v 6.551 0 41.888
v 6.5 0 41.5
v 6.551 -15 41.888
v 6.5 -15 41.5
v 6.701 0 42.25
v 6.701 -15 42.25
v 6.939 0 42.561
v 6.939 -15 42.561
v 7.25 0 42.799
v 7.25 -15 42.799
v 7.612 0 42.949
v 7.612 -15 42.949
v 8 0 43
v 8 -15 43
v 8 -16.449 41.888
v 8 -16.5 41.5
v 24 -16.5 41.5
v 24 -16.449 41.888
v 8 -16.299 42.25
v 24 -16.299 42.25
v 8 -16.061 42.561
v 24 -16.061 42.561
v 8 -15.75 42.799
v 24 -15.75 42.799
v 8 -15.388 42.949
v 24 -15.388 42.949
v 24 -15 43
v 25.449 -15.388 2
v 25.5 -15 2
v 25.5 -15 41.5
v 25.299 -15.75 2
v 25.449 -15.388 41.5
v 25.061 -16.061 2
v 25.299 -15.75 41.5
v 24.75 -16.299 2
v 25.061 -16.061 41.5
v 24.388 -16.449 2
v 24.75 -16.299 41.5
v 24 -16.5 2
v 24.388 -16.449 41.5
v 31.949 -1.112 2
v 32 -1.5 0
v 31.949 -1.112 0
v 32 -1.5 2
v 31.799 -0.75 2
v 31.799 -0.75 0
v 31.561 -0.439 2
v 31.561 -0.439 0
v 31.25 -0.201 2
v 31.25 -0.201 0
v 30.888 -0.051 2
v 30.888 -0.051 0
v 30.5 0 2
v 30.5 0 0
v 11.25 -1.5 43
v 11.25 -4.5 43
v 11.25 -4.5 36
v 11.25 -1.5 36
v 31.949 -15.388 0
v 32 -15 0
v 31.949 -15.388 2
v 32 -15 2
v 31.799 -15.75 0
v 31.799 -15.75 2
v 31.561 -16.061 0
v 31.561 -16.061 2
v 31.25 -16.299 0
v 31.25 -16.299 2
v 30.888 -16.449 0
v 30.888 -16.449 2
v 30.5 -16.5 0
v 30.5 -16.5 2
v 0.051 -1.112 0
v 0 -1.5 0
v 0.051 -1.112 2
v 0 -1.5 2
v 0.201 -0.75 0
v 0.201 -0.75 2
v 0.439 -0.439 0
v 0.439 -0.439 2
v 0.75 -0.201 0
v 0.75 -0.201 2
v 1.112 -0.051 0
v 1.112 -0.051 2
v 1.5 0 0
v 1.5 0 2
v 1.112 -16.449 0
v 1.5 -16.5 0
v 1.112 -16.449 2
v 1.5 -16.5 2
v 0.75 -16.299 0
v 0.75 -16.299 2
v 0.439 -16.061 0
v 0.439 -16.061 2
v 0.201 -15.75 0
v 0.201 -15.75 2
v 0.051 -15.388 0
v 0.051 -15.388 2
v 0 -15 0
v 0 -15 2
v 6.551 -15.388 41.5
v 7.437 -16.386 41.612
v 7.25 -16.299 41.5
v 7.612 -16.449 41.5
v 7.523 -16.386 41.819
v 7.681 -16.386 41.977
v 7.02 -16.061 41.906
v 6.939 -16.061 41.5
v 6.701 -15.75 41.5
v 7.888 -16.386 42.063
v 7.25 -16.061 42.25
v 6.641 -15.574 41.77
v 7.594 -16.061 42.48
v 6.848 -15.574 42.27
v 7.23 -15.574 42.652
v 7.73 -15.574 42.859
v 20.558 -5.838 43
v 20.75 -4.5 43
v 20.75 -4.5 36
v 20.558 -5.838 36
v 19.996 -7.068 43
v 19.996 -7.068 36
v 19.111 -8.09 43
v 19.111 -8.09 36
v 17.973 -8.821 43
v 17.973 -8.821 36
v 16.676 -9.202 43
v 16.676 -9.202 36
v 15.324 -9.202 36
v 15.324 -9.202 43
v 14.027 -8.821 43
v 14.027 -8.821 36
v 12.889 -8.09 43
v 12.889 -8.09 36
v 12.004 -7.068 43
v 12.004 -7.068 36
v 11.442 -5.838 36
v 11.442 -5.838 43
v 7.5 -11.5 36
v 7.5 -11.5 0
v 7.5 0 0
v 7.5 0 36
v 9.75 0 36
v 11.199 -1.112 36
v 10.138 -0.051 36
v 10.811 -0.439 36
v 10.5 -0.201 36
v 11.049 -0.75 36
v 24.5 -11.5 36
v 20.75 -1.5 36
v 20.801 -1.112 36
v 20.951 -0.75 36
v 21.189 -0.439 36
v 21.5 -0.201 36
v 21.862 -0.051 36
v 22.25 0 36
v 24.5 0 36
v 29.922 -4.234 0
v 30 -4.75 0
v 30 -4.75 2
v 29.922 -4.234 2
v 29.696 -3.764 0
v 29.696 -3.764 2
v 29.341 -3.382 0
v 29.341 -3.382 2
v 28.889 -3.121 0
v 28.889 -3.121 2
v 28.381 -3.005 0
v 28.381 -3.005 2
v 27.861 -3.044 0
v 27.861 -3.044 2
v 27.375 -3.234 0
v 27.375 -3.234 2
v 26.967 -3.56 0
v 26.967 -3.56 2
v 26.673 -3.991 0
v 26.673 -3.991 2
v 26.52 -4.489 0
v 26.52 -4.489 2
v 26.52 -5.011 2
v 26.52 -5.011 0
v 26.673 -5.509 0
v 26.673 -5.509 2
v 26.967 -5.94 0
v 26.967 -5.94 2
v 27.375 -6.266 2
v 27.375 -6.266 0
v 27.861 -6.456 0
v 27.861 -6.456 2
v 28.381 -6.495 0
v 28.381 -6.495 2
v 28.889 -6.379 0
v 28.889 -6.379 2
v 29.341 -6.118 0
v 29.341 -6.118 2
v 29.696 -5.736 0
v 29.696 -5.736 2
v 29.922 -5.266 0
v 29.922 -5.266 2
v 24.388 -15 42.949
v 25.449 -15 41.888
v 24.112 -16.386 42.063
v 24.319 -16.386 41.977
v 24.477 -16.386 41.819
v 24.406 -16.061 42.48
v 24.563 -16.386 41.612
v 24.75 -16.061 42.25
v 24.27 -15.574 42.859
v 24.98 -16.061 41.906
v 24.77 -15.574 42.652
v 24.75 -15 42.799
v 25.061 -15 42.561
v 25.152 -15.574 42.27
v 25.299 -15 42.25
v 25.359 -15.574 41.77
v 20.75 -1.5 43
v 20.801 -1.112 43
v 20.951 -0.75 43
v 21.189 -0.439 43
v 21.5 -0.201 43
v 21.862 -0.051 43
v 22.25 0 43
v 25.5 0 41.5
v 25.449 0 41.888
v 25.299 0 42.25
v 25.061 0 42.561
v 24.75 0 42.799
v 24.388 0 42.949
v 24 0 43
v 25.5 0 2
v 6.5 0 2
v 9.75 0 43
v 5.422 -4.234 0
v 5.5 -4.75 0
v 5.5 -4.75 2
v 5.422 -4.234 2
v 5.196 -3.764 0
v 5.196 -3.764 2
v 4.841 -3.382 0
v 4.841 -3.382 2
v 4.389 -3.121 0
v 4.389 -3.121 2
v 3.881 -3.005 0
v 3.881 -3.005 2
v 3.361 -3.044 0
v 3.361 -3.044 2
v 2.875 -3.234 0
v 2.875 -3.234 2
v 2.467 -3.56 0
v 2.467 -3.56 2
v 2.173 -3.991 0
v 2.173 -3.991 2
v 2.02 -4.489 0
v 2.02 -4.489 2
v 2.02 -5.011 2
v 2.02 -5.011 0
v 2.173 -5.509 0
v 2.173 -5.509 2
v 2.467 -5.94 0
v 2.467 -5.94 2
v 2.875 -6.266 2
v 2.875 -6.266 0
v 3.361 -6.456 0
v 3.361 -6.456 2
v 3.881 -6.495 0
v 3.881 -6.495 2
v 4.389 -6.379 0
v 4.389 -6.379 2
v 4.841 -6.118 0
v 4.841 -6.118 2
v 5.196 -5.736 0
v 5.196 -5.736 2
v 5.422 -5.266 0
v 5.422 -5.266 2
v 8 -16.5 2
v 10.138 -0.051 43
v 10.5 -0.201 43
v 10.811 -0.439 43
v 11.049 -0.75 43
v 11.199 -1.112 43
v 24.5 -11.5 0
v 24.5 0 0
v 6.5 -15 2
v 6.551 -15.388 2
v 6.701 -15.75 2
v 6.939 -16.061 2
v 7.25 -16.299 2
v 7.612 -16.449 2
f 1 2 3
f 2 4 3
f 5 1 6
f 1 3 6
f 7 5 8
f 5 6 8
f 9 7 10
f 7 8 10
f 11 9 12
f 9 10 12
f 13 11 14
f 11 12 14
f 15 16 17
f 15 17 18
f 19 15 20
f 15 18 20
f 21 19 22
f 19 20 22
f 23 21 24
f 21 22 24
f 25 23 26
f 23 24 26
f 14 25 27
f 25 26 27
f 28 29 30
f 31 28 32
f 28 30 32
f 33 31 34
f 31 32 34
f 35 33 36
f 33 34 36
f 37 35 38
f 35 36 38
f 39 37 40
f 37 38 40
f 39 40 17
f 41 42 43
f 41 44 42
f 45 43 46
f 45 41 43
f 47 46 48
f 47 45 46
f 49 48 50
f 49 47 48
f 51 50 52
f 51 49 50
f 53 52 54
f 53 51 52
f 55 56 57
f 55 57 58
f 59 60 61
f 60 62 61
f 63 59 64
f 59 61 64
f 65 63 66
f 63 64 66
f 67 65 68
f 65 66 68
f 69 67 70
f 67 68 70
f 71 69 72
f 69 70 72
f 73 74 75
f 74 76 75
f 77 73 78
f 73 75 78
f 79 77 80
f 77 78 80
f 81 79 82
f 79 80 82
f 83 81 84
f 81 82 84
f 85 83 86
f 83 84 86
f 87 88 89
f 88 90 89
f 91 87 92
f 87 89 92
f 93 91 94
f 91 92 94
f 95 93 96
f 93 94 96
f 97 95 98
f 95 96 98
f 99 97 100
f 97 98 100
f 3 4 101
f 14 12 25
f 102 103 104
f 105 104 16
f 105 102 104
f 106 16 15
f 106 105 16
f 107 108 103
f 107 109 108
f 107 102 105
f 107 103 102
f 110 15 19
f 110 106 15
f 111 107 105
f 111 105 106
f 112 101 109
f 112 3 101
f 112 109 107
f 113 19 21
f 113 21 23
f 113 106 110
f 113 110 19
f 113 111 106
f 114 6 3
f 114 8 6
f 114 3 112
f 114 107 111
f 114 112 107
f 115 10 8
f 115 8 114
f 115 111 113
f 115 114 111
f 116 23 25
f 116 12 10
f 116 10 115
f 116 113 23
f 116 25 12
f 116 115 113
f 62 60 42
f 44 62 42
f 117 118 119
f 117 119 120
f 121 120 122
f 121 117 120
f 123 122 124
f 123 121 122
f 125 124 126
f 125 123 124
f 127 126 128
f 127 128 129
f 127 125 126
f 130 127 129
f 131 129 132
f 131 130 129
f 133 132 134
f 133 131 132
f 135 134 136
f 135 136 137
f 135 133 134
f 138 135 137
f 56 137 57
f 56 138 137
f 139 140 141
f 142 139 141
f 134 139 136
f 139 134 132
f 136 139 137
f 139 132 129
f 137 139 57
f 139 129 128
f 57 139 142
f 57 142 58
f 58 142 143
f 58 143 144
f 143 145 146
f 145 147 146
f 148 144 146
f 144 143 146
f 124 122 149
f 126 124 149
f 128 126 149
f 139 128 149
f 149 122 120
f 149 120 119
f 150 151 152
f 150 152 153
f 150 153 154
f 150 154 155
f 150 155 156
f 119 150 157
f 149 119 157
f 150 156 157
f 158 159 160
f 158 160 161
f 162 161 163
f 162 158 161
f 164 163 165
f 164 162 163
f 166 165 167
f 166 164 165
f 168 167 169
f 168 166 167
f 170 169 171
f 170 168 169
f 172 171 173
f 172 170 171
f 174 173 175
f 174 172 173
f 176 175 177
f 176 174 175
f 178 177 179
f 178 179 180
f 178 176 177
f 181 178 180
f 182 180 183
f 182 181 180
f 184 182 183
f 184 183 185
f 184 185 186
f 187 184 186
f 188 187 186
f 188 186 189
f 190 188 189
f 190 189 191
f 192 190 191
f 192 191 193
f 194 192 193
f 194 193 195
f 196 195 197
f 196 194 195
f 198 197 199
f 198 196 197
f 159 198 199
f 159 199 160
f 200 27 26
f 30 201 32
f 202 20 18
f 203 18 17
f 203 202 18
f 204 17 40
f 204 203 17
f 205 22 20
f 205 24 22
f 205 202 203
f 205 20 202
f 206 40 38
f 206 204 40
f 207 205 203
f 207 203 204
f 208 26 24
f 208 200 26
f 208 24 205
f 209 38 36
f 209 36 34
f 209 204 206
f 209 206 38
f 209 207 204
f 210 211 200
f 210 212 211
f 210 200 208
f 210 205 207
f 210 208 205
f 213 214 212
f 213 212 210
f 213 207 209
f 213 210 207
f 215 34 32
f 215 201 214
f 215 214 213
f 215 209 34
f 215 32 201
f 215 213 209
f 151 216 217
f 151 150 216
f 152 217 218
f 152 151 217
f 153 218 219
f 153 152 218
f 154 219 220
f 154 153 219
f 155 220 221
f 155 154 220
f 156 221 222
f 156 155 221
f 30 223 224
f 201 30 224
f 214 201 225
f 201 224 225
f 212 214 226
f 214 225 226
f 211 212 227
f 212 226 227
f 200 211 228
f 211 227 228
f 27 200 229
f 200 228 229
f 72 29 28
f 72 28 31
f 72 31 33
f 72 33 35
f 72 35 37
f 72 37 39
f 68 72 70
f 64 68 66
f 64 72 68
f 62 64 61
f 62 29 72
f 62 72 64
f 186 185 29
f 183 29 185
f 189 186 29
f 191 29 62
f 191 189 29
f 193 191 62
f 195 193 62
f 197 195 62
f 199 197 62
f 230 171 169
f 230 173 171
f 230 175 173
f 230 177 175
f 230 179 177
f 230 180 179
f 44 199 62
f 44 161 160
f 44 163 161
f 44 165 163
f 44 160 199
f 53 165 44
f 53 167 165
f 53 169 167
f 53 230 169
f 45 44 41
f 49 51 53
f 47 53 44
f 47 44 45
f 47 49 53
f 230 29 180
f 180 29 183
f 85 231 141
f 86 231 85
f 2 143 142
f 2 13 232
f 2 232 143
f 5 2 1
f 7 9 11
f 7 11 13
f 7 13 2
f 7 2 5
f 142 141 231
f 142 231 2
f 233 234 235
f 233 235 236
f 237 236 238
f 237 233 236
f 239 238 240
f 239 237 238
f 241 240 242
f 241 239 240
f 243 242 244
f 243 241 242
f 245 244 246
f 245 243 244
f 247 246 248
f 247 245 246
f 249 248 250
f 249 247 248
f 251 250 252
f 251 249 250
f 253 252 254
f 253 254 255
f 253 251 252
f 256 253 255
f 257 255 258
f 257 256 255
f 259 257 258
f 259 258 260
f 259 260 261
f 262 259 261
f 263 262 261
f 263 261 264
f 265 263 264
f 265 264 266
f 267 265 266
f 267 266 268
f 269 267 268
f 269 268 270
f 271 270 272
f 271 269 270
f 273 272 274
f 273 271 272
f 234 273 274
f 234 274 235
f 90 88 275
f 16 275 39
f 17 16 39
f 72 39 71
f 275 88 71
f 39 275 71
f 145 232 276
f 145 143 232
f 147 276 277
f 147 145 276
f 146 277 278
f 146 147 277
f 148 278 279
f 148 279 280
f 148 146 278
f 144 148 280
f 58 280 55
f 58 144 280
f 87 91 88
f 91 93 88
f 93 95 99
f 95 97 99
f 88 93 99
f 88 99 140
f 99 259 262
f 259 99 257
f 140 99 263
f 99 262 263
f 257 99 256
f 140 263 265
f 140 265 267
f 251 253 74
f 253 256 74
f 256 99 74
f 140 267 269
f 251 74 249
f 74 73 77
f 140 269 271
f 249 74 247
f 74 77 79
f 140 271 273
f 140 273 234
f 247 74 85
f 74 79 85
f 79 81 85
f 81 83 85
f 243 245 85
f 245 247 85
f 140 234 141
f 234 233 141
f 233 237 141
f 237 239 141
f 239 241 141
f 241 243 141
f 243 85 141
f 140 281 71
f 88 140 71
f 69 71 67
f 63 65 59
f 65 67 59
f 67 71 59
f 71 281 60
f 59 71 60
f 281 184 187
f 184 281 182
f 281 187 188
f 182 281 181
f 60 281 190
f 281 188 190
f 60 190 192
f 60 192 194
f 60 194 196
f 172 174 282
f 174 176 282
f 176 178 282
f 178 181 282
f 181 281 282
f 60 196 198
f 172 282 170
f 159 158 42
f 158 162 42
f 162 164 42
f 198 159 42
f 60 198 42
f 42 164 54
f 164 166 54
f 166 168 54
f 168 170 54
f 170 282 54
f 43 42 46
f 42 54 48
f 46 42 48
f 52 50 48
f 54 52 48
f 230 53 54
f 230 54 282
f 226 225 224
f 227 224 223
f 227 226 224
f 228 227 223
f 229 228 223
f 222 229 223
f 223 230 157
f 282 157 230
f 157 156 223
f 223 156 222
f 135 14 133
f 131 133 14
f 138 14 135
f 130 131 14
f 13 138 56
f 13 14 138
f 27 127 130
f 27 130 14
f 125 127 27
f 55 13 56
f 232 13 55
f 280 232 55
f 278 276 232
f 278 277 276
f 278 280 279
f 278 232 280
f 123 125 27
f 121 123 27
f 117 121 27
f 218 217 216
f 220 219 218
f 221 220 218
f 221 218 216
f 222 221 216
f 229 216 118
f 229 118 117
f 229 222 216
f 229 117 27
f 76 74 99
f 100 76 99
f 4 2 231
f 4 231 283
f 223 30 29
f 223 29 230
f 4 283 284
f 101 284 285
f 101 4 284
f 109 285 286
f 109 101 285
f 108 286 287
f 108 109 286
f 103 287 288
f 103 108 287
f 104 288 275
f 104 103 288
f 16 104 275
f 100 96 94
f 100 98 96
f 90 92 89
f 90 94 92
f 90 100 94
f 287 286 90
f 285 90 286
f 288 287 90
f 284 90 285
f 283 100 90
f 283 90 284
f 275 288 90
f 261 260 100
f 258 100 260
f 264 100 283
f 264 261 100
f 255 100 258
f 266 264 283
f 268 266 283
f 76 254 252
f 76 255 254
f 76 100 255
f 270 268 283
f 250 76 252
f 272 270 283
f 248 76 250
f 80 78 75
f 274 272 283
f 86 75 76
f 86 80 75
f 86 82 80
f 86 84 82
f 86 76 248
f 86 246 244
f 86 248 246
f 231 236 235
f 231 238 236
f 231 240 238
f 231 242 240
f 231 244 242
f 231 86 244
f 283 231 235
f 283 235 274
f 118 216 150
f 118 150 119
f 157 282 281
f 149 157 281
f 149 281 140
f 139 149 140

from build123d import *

# Parameters (mm, degrees)
F0_R     = 1.75
F1_DEPTH = 2
F3_DEPTH = 41
F5_DEPTH = 7
F6_R     = 1.5


with BuildPart() as f1:
    # F0 (on Top) → F1 (new body)
    with BuildSketch(Plane.XY):
        Polygon((0, 0), (0, -16.5), (32, -16.5), (32, 0), (24.5, 0), (24.5, -11.5), (7.5, -11.5), (7.5, 0), align=None)
        with Locations((3.75, -4.75)):
            Circle(F0_R, mode=Mode.SUBTRACT)
        with Locations((28.25, -4.75)):
            Circle(F0_R, mode=Mode.SUBTRACT)
    extrude(amount=F1_DEPTH)

    # F2 (on face) → F3 (join)
    with BuildSketch(Plane.XY.offset(2)):
        Polygon((7.5, -11.5), (7.5, 0), (6.5, 0), (6.5, -16.5), (25.5, -16.5), (25.5, 0), (24.5, 0), (24.5, -11.5), align=None)
    extrude(amount=F3_DEPTH)

    # F4 (on face) → F5 (join)
    with BuildSketch(Plane.XY.offset(43)):
        with BuildLine():
            Line((20.75, 0), (20.75, -4.5))
            ThreePointArc((20.75, -4.5), (16, -9.25), (11.25, -4.5))
            Line((11.25, -4.5), (11.25, 0))
            Line((11.25, 0), (7.5, 0))
            Line((7.5, 0), (7.5, -11.5))
            Line((7.5, -11.5), (24.5, -11.5))
            Line((24.5, -11.5), (24.5, 0))
            Line((24.5, 0), (20.75, 0))
        make_face()
    extrude(amount=-F5_DEPTH)

    # F6
    f6_edges = [f1.edges().sort_by_distance(p)[0] for p in [
        (25.5, -8.25, 43),
        (11.25, 0, 39.5),
        (20.75, 0, 39.5),
        (6.5, -8.25, 43),
        (6.5, -16.5, 22.5),
        (16, -16.5, 43),
        (25.5, -16.5, 22.5),
        (32, -16.5, 1),
        (32, 0, 1),
        (0, -16.5, 1),
        (0, 0, 1),
    ]]
    fillet(f6_edges, radius=F6_R)


solid = f1.part
